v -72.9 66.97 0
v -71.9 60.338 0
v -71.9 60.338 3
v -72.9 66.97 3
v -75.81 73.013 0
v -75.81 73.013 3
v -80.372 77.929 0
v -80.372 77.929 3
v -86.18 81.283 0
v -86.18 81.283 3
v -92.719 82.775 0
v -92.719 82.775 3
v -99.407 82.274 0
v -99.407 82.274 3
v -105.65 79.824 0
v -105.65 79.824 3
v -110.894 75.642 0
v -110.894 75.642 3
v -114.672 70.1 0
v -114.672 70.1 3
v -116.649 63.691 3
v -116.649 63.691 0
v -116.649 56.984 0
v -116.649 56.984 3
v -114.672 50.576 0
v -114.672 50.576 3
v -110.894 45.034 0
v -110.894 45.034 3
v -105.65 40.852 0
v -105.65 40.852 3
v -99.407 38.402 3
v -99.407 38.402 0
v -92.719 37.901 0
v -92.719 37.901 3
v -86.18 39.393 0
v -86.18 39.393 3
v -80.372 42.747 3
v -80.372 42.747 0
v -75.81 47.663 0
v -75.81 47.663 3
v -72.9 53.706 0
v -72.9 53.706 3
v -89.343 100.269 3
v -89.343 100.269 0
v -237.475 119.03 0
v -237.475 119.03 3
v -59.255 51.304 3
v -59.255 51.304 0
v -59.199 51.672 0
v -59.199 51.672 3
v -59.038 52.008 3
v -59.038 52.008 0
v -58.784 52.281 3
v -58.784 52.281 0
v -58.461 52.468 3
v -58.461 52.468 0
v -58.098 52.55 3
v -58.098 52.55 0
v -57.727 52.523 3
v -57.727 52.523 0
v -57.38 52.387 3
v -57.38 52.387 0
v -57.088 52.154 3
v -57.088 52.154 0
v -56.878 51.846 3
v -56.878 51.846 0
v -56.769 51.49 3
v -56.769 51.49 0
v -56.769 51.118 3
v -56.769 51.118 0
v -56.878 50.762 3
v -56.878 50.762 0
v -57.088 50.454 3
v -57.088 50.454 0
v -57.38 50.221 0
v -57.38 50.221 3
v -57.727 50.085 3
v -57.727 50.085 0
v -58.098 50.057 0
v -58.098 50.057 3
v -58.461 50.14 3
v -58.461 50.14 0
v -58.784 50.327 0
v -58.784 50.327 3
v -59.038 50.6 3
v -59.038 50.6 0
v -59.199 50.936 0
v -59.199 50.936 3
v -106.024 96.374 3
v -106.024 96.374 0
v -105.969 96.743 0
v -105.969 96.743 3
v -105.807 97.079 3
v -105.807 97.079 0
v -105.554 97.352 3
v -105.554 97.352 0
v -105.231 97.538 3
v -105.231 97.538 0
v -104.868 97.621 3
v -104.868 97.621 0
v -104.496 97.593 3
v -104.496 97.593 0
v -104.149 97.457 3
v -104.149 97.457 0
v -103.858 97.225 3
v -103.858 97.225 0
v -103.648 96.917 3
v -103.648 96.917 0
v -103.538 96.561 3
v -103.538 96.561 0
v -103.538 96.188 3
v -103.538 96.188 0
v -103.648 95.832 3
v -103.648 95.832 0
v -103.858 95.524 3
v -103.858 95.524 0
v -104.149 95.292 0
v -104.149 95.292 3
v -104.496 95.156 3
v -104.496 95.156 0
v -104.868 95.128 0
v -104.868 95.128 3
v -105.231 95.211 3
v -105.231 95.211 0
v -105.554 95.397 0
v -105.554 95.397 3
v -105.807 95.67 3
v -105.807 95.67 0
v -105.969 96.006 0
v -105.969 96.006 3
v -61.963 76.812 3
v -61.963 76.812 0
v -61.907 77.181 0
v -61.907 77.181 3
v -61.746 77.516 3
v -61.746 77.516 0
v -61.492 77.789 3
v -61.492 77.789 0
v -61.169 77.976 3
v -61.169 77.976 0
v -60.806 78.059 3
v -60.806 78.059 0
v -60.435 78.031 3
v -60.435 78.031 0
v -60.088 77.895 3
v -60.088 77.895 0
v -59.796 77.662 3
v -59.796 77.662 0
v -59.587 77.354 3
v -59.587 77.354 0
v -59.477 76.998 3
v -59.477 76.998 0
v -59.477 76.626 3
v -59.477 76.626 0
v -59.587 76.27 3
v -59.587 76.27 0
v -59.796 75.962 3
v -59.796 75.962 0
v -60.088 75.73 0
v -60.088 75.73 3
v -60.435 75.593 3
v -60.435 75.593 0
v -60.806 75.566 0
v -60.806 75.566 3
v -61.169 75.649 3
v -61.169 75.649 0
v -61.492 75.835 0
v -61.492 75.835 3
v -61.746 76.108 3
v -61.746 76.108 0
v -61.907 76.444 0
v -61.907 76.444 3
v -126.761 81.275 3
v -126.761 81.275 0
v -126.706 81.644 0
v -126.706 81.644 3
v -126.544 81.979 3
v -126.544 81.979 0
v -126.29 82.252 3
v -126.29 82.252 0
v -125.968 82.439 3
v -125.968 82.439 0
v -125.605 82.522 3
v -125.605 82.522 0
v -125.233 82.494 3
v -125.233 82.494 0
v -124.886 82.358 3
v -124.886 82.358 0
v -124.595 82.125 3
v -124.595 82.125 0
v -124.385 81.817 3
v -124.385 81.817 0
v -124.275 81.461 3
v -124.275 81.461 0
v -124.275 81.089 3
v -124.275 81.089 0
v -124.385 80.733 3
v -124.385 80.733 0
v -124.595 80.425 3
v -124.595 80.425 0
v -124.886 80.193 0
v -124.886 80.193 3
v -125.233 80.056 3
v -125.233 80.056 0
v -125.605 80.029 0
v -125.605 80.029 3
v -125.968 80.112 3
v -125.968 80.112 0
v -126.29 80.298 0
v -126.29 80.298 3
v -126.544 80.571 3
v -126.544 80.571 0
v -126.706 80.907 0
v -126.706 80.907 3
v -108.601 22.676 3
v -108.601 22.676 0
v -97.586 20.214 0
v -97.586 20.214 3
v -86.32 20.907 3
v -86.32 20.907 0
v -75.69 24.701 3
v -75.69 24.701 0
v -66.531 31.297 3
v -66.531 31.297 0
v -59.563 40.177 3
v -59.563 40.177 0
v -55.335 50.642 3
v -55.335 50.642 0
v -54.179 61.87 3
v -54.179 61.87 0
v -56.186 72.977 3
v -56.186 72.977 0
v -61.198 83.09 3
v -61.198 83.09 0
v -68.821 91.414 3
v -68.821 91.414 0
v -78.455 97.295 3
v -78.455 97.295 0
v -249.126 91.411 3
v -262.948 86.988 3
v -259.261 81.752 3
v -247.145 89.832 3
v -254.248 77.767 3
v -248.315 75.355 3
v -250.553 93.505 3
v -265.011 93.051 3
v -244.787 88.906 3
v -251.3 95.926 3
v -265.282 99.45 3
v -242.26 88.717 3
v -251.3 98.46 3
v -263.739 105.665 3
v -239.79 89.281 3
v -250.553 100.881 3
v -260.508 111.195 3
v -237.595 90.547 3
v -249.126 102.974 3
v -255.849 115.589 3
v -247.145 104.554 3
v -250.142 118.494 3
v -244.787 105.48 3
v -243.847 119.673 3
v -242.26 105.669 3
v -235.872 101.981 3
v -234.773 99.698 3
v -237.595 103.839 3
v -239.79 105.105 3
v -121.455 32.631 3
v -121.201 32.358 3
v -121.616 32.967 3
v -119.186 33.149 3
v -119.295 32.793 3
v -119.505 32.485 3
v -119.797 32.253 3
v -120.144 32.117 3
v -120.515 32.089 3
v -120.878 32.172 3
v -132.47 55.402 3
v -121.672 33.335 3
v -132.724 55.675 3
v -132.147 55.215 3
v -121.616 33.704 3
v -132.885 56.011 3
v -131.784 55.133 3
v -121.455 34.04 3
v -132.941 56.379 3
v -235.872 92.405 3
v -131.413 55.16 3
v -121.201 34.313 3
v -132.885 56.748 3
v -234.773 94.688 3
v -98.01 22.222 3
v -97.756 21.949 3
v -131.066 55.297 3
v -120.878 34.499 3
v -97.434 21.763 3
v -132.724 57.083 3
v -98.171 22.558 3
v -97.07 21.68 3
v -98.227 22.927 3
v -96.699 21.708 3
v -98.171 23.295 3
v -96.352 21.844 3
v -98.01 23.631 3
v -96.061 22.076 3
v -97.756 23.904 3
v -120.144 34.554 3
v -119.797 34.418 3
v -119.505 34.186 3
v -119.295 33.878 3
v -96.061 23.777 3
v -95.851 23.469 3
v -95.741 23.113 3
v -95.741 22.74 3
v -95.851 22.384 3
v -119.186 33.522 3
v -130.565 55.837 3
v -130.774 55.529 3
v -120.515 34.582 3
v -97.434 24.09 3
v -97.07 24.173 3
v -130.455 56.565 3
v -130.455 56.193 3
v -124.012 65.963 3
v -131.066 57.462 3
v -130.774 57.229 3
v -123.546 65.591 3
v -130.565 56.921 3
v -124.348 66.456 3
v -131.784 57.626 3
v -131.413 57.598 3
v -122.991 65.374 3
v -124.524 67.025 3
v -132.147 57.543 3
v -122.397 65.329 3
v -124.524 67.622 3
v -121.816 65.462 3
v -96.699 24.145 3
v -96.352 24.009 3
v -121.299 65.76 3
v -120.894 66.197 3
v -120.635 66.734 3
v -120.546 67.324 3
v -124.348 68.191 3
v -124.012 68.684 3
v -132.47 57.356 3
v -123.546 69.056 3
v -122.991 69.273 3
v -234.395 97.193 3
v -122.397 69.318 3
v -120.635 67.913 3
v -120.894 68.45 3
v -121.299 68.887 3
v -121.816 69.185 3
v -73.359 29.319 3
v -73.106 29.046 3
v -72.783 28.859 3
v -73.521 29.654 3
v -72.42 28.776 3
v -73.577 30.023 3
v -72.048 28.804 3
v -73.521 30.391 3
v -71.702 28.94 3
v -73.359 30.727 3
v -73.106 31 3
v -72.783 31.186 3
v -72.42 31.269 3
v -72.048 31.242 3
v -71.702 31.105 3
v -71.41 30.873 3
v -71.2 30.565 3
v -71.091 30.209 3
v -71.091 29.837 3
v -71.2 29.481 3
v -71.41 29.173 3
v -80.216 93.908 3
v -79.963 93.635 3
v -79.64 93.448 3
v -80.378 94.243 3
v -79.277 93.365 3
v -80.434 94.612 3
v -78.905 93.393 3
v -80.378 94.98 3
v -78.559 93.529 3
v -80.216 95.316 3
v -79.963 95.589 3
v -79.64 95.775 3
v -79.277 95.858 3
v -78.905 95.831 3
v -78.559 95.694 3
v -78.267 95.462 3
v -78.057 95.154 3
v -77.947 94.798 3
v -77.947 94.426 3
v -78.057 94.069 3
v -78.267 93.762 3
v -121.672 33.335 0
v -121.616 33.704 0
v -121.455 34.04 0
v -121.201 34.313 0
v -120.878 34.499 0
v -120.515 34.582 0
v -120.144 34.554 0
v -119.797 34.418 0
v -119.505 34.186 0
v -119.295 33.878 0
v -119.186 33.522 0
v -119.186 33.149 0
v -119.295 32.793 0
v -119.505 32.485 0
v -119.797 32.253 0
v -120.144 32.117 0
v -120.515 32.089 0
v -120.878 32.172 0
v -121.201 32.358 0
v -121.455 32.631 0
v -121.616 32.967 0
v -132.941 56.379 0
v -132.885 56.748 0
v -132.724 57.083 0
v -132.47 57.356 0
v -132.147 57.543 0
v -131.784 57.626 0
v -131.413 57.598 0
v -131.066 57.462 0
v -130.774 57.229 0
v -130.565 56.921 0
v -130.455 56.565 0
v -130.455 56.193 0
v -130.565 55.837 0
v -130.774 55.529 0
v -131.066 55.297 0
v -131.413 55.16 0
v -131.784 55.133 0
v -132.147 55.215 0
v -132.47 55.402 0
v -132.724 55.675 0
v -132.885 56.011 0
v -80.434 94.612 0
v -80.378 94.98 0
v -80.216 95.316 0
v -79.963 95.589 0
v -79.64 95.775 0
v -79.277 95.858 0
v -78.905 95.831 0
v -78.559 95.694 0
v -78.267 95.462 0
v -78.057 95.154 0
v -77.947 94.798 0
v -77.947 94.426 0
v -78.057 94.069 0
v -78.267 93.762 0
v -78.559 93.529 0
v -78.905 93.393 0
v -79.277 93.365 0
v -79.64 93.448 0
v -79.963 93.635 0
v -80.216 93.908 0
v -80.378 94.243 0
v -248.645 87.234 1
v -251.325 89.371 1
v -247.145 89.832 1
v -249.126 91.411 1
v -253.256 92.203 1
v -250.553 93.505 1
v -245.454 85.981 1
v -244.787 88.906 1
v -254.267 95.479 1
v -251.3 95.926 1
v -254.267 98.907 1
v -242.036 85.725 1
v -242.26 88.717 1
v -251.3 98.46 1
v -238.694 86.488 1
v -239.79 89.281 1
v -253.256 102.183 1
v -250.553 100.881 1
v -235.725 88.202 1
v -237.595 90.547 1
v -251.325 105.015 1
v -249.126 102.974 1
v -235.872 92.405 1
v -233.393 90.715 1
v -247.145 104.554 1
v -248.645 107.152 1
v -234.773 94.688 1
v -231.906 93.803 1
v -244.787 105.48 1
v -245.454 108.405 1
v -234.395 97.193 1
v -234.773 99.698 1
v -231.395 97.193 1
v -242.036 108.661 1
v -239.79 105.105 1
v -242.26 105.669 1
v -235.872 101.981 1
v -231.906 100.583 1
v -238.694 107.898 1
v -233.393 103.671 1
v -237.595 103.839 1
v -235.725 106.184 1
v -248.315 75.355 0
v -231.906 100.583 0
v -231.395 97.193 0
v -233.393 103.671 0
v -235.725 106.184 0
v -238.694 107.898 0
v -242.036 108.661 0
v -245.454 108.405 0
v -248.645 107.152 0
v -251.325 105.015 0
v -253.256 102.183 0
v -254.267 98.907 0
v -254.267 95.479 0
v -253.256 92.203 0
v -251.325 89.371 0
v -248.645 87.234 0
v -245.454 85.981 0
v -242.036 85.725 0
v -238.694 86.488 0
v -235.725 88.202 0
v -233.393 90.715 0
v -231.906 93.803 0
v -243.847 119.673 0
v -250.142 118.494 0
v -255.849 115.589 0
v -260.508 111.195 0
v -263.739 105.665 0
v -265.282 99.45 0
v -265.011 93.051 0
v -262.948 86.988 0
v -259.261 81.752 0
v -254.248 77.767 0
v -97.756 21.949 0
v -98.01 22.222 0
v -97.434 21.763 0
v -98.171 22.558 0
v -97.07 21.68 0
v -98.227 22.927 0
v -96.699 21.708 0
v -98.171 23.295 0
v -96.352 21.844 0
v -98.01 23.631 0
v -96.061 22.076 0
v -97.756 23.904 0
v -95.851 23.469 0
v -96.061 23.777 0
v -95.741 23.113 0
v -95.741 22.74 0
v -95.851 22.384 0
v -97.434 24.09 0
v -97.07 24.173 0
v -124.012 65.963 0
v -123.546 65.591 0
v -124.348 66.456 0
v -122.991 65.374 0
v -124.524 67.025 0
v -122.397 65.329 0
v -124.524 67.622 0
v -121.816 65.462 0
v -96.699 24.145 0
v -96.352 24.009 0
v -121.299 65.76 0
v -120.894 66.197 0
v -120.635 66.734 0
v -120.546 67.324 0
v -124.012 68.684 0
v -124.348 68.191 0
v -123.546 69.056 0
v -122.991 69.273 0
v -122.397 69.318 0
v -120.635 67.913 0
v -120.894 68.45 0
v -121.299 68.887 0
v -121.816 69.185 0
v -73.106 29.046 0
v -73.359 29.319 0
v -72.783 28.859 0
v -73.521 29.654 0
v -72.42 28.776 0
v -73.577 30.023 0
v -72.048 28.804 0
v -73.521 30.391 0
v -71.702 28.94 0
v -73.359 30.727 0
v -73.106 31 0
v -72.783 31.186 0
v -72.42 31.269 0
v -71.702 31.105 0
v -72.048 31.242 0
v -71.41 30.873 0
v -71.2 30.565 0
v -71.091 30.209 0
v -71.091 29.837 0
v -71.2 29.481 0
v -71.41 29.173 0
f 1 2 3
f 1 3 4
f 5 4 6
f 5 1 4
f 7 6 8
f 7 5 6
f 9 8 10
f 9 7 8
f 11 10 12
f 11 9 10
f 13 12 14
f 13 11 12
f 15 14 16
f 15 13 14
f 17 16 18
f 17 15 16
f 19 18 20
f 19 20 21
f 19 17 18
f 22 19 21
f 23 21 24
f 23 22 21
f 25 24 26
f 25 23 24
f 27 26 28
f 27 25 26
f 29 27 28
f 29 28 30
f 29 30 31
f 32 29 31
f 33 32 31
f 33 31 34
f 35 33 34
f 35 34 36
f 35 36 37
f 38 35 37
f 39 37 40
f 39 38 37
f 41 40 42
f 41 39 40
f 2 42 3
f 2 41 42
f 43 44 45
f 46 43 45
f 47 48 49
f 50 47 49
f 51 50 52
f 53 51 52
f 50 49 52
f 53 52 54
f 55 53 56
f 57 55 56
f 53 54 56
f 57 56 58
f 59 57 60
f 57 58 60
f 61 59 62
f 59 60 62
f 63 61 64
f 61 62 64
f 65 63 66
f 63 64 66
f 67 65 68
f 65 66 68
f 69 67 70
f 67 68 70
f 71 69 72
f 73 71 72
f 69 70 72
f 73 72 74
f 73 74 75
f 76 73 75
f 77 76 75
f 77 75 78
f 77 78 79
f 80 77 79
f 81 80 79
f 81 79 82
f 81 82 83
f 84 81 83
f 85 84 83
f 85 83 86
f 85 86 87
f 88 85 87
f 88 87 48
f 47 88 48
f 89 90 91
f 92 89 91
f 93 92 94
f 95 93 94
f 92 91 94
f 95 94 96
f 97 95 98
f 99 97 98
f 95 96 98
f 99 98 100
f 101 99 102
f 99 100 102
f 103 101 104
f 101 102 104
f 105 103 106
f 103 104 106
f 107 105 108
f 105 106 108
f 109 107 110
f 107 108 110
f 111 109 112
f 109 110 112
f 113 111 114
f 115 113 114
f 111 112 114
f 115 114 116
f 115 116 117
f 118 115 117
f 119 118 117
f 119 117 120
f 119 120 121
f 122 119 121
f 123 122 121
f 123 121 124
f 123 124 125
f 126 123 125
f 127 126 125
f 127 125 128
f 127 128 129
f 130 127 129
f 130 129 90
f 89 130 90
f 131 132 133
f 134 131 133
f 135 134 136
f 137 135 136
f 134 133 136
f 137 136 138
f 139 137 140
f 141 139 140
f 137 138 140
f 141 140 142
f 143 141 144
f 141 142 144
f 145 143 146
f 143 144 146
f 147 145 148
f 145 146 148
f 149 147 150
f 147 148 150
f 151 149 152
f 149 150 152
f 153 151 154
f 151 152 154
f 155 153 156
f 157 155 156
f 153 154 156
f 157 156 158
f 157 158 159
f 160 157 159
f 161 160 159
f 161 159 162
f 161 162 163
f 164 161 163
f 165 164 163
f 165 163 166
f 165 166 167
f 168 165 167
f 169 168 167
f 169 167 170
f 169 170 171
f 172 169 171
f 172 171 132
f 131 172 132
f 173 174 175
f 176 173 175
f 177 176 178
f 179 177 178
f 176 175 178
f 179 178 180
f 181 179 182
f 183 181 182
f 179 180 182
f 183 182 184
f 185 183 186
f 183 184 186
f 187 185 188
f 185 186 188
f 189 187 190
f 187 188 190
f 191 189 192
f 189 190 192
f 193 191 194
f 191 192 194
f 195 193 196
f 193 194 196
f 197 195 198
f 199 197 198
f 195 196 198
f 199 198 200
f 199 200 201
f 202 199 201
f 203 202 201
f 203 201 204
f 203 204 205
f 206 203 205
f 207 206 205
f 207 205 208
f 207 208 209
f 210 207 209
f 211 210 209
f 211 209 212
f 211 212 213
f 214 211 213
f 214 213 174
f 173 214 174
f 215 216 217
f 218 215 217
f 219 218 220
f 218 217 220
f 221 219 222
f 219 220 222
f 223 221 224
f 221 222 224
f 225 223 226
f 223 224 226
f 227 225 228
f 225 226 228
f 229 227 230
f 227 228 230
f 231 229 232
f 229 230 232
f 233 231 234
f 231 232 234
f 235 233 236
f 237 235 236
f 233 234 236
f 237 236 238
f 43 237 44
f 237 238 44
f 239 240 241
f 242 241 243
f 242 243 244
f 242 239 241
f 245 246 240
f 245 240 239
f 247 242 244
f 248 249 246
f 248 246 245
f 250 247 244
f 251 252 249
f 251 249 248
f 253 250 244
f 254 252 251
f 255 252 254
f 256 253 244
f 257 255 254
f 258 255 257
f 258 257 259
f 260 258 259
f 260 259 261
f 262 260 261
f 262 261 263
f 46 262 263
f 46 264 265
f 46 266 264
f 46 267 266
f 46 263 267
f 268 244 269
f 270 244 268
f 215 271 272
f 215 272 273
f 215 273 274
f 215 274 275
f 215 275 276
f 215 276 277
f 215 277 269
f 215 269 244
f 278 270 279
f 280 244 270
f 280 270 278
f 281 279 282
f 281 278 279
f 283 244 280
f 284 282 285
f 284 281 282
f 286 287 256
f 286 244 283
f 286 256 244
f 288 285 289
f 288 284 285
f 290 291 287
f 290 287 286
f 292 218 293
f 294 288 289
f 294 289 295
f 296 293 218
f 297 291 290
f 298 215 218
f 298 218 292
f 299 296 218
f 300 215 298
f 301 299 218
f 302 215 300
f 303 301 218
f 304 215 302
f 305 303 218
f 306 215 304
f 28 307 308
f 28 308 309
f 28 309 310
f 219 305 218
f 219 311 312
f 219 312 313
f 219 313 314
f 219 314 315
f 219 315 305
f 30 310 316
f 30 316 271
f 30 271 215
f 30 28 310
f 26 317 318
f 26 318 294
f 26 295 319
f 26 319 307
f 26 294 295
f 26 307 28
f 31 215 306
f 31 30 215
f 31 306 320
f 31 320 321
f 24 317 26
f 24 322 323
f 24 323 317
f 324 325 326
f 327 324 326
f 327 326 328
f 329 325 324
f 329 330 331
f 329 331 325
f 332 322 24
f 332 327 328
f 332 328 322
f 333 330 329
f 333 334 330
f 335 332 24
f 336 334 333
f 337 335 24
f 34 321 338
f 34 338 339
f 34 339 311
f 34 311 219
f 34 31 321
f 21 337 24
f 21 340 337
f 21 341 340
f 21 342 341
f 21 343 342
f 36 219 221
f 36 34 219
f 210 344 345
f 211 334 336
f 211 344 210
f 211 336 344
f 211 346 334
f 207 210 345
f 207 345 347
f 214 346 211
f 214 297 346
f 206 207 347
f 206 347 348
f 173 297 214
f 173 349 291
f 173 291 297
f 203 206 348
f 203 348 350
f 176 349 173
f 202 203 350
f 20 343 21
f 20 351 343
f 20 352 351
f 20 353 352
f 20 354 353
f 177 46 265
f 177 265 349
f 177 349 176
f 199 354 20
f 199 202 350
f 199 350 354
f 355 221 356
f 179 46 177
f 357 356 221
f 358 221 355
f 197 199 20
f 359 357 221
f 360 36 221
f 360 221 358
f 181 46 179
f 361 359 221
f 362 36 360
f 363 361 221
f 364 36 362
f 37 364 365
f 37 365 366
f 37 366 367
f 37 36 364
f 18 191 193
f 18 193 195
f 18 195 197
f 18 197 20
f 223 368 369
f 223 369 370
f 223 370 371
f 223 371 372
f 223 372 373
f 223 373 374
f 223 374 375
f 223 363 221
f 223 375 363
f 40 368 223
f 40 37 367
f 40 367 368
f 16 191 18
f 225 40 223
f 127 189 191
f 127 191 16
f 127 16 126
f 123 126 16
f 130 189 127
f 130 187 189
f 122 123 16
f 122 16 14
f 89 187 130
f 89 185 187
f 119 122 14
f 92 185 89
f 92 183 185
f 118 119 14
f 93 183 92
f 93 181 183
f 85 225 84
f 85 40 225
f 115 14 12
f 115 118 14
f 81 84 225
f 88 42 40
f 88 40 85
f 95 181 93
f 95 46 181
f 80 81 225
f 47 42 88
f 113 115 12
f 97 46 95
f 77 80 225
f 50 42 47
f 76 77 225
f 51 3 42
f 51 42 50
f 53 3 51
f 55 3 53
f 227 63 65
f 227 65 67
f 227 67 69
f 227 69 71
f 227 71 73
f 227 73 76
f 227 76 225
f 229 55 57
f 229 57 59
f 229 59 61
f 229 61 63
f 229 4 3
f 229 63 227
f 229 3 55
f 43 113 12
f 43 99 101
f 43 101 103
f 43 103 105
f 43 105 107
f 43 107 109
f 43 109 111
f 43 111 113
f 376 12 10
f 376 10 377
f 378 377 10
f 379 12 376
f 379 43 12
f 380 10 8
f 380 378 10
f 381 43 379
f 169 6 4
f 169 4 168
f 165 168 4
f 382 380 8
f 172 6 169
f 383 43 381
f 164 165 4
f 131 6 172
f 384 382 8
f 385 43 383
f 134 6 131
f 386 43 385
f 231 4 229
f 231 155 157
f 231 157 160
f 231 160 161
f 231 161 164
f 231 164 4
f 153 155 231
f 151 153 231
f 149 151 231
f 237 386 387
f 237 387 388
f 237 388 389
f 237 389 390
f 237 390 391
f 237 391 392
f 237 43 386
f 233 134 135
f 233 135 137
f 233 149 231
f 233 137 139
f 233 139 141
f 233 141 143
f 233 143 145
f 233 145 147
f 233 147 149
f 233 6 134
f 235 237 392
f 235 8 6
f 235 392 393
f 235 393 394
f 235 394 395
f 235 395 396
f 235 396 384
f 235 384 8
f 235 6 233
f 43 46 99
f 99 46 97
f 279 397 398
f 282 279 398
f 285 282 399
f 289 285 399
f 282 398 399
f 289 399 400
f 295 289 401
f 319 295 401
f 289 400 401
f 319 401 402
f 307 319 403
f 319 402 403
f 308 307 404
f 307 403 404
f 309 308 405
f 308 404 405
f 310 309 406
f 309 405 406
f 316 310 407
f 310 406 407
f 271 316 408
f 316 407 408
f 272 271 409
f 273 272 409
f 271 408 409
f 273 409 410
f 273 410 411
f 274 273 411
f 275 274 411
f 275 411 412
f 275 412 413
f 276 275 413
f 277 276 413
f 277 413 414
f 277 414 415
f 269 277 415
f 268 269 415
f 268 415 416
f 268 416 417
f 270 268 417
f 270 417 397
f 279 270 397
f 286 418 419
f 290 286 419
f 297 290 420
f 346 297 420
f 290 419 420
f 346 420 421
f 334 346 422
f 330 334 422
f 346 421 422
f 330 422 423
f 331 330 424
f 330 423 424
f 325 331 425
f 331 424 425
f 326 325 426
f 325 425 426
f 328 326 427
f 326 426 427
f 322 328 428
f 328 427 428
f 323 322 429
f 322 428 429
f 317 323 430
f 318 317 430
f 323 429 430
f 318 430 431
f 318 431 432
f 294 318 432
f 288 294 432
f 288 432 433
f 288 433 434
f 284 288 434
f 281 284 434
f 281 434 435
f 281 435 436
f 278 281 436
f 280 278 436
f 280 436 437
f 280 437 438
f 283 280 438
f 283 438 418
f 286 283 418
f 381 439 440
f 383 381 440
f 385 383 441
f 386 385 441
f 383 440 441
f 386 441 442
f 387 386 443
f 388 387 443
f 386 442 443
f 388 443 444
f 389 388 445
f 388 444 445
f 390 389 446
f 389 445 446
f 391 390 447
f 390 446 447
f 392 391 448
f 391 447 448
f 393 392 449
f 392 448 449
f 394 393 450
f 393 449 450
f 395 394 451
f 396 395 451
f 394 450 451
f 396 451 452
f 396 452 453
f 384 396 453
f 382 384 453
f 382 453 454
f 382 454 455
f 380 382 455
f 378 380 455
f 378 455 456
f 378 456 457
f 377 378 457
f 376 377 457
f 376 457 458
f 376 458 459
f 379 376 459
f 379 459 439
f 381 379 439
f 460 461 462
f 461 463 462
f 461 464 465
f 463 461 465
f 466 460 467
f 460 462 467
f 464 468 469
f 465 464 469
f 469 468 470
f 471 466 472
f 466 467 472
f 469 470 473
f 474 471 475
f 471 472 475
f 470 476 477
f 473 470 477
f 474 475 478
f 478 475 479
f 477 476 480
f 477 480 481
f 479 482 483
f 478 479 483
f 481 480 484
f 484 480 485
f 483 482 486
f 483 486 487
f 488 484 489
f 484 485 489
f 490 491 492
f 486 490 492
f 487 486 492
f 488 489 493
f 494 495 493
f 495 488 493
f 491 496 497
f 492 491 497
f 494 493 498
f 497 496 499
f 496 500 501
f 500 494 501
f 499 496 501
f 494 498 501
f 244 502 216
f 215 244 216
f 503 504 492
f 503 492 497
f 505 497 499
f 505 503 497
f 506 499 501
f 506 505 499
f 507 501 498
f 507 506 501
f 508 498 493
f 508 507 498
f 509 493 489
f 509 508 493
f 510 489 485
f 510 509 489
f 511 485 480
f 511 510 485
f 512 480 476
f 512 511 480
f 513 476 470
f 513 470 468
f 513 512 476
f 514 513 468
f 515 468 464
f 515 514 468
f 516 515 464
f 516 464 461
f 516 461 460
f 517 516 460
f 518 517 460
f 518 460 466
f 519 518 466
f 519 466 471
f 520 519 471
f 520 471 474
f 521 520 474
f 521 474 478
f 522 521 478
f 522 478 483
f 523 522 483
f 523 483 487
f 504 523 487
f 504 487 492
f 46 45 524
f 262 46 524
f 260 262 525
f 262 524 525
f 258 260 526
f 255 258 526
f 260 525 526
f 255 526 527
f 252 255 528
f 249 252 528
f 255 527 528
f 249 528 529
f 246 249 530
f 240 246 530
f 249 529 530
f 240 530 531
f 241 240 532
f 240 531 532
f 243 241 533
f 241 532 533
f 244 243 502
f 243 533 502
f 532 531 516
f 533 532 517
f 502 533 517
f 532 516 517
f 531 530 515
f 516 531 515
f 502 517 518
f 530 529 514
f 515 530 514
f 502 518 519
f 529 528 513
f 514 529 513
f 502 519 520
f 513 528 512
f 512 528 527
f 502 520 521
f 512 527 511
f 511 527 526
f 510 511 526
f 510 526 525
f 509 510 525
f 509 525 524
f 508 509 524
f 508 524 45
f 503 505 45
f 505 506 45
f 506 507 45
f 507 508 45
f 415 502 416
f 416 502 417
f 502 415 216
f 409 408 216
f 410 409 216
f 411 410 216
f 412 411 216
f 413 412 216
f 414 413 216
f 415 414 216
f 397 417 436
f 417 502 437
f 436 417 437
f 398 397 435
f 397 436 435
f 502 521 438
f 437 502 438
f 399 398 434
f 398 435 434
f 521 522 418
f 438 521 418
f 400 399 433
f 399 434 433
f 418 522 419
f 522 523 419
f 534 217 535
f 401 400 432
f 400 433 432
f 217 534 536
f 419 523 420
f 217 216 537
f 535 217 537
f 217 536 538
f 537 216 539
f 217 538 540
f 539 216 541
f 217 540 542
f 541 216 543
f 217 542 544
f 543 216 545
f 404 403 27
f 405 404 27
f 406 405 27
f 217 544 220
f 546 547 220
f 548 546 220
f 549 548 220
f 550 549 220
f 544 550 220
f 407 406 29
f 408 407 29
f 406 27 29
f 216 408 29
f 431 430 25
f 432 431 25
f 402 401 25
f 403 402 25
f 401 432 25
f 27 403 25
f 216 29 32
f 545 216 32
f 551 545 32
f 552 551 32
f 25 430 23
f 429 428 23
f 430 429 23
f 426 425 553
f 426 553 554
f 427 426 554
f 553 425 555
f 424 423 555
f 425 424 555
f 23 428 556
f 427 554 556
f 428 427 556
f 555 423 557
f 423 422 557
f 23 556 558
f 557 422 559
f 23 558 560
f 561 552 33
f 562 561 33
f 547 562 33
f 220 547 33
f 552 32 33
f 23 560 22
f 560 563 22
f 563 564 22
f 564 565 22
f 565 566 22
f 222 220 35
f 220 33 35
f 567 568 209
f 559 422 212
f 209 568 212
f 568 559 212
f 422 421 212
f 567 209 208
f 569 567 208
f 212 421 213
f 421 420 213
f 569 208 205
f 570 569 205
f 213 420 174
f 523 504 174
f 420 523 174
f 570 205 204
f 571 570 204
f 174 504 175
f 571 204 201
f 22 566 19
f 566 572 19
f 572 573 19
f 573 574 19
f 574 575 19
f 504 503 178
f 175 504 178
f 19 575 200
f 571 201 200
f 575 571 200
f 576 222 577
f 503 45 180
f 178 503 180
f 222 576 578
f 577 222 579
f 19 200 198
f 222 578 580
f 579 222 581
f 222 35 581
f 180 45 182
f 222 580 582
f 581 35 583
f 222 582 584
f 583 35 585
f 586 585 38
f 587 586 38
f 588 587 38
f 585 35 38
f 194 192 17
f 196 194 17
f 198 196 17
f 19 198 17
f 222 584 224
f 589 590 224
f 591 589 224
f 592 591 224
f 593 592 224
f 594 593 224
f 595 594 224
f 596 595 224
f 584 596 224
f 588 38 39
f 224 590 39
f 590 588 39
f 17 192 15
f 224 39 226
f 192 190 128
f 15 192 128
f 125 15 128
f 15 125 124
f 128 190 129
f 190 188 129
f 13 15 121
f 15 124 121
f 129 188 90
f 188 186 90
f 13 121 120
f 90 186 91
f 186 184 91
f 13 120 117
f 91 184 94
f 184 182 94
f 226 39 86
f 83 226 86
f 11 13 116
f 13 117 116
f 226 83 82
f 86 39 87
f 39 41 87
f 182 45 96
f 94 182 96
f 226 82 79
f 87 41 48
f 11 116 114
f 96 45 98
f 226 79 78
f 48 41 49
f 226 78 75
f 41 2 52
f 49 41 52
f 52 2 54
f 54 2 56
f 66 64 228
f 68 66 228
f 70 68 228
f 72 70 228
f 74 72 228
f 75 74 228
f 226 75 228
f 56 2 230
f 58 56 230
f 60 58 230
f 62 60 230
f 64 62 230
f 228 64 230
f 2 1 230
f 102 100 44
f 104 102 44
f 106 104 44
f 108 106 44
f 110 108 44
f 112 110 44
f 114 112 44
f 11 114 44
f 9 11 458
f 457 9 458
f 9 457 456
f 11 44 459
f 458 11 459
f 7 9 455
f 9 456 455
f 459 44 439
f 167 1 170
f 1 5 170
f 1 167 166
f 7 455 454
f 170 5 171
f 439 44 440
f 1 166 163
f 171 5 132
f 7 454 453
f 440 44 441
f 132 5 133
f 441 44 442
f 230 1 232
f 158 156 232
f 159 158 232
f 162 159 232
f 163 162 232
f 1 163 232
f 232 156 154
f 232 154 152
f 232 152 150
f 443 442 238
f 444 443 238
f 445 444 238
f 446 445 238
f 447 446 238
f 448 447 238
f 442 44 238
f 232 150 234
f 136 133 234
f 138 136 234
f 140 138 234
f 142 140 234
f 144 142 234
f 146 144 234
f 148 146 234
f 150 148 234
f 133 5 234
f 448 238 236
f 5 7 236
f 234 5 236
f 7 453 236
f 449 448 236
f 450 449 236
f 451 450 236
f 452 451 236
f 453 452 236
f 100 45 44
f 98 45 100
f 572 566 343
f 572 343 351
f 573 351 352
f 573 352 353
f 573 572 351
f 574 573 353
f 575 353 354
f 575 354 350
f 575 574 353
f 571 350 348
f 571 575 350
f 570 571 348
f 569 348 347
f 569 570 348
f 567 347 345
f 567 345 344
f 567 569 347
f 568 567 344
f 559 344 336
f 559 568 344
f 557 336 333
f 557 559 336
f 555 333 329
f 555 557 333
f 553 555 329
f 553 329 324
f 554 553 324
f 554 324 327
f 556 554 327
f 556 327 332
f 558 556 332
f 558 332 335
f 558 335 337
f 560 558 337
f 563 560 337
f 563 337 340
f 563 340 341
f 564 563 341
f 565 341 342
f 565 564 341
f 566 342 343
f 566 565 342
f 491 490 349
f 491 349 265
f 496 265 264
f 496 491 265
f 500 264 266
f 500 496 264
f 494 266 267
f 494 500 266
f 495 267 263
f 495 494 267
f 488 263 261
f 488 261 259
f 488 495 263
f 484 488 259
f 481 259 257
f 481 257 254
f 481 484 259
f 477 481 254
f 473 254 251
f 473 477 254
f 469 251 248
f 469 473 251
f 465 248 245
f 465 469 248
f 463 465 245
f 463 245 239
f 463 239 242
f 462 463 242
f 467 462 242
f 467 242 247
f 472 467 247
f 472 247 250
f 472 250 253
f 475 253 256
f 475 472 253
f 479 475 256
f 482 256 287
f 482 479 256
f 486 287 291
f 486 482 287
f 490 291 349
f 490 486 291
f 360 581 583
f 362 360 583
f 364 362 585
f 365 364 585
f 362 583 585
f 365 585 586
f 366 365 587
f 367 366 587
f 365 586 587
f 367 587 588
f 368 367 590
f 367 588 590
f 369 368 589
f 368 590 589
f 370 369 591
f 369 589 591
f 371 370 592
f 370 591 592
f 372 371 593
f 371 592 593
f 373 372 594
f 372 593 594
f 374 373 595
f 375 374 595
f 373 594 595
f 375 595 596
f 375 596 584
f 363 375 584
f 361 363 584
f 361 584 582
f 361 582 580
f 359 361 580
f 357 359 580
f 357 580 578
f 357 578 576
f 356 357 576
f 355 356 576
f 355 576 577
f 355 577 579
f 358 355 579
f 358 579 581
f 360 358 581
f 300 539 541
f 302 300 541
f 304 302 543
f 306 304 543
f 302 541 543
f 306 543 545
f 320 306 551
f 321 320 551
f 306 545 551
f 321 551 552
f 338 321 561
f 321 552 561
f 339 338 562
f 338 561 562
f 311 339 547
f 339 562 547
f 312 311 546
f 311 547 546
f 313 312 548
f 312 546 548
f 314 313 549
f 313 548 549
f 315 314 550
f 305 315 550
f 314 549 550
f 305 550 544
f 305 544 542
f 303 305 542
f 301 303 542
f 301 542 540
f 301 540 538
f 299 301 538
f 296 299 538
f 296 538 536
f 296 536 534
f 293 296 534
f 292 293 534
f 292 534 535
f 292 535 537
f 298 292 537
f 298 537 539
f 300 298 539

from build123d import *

# Parameters (mm, degrees)
SKETCH_2_R         = 11.5
SKETCH_2_R_2       = 22.5
SKETCH_2_R_3       = 2
EXTRUDE_1_DEPTH    = 3
EXTRUDE_START      = 1
SKETCH_2_3_R       = 11.5
SKETCH_2_3_R_2     = 8.5
EXTRUDE_2_DEPTH    = 2
HOLE_WIZARD_M3_1_D = 2.5


with BuildPart() as part:
    # 草图2 → 凸台-拉伸1 (new body)
    with BuildSketch(Plane.XY):
        with BuildLine():
            Line((-89.342878346, 100.2689352), (-237.47523438, 119.030406823))
            ThreePointArc((-237.47523438, 119.030406823), (-264.732559951, 102.612788157), (-248.314941285, 75.355462585))
            Line((-248.314941285, 75.355462585), (-108.600675895, 22.676132978))
            ThreePointArc((-108.600675895, 22.676132978), (-55.335467517, 50.642415933), (-89.342878346, 100.2689352))
        make_face()
        with Locations((-242.895087832, 97.192934704)):
            Circle(SKETCH_2_R, mode=Mode.SUBTRACT)
        with Locations((-94.40027703, 60.337932808)):
            Circle(SKETCH_2_R_2, mode=Mode.SUBTRACT)
        with Locations((-122.546352319, 67.32352005)):
            Circle(SKETCH_2_R_3, mode=Mode.SUBTRACT)
    extrude(amount=EXTRUDE_1_DEPTH)

    # 草图2<3> → 凸台-拉伸2 (add)
    with BuildSketch(Plane.XY.offset(EXTRUDE_START)):
        with Locations((-242.895087832, 97.192934704)):
            Circle(SKETCH_2_3_R)
        with Locations((-242.895087832, 97.192934704)):
            Circle(SKETCH_2_3_R_2, mode=Mode.SUBTRACT)
    extrude(amount=EXTRUDE_2_DEPTH)

    # M3 螺纹孔1 (through all)
    with Locations(Plane.XY.offset(3)):
        with Locations((-79.183536118, 94.611841193), (-60.712733566, 76.812137352), (-58.004707111, 51.303968462), (-72.326572251, 30.022892769), (-96.97696912, 22.926562105), (-120.421703236, 33.33542592), (-131.690722835, 56.379062808), (-125.511128404, 81.275098967), (-104.774420857, 96.374402389)):
            Hole(HOLE_WIZARD_M3_1_D / 2)


solid = part.part
